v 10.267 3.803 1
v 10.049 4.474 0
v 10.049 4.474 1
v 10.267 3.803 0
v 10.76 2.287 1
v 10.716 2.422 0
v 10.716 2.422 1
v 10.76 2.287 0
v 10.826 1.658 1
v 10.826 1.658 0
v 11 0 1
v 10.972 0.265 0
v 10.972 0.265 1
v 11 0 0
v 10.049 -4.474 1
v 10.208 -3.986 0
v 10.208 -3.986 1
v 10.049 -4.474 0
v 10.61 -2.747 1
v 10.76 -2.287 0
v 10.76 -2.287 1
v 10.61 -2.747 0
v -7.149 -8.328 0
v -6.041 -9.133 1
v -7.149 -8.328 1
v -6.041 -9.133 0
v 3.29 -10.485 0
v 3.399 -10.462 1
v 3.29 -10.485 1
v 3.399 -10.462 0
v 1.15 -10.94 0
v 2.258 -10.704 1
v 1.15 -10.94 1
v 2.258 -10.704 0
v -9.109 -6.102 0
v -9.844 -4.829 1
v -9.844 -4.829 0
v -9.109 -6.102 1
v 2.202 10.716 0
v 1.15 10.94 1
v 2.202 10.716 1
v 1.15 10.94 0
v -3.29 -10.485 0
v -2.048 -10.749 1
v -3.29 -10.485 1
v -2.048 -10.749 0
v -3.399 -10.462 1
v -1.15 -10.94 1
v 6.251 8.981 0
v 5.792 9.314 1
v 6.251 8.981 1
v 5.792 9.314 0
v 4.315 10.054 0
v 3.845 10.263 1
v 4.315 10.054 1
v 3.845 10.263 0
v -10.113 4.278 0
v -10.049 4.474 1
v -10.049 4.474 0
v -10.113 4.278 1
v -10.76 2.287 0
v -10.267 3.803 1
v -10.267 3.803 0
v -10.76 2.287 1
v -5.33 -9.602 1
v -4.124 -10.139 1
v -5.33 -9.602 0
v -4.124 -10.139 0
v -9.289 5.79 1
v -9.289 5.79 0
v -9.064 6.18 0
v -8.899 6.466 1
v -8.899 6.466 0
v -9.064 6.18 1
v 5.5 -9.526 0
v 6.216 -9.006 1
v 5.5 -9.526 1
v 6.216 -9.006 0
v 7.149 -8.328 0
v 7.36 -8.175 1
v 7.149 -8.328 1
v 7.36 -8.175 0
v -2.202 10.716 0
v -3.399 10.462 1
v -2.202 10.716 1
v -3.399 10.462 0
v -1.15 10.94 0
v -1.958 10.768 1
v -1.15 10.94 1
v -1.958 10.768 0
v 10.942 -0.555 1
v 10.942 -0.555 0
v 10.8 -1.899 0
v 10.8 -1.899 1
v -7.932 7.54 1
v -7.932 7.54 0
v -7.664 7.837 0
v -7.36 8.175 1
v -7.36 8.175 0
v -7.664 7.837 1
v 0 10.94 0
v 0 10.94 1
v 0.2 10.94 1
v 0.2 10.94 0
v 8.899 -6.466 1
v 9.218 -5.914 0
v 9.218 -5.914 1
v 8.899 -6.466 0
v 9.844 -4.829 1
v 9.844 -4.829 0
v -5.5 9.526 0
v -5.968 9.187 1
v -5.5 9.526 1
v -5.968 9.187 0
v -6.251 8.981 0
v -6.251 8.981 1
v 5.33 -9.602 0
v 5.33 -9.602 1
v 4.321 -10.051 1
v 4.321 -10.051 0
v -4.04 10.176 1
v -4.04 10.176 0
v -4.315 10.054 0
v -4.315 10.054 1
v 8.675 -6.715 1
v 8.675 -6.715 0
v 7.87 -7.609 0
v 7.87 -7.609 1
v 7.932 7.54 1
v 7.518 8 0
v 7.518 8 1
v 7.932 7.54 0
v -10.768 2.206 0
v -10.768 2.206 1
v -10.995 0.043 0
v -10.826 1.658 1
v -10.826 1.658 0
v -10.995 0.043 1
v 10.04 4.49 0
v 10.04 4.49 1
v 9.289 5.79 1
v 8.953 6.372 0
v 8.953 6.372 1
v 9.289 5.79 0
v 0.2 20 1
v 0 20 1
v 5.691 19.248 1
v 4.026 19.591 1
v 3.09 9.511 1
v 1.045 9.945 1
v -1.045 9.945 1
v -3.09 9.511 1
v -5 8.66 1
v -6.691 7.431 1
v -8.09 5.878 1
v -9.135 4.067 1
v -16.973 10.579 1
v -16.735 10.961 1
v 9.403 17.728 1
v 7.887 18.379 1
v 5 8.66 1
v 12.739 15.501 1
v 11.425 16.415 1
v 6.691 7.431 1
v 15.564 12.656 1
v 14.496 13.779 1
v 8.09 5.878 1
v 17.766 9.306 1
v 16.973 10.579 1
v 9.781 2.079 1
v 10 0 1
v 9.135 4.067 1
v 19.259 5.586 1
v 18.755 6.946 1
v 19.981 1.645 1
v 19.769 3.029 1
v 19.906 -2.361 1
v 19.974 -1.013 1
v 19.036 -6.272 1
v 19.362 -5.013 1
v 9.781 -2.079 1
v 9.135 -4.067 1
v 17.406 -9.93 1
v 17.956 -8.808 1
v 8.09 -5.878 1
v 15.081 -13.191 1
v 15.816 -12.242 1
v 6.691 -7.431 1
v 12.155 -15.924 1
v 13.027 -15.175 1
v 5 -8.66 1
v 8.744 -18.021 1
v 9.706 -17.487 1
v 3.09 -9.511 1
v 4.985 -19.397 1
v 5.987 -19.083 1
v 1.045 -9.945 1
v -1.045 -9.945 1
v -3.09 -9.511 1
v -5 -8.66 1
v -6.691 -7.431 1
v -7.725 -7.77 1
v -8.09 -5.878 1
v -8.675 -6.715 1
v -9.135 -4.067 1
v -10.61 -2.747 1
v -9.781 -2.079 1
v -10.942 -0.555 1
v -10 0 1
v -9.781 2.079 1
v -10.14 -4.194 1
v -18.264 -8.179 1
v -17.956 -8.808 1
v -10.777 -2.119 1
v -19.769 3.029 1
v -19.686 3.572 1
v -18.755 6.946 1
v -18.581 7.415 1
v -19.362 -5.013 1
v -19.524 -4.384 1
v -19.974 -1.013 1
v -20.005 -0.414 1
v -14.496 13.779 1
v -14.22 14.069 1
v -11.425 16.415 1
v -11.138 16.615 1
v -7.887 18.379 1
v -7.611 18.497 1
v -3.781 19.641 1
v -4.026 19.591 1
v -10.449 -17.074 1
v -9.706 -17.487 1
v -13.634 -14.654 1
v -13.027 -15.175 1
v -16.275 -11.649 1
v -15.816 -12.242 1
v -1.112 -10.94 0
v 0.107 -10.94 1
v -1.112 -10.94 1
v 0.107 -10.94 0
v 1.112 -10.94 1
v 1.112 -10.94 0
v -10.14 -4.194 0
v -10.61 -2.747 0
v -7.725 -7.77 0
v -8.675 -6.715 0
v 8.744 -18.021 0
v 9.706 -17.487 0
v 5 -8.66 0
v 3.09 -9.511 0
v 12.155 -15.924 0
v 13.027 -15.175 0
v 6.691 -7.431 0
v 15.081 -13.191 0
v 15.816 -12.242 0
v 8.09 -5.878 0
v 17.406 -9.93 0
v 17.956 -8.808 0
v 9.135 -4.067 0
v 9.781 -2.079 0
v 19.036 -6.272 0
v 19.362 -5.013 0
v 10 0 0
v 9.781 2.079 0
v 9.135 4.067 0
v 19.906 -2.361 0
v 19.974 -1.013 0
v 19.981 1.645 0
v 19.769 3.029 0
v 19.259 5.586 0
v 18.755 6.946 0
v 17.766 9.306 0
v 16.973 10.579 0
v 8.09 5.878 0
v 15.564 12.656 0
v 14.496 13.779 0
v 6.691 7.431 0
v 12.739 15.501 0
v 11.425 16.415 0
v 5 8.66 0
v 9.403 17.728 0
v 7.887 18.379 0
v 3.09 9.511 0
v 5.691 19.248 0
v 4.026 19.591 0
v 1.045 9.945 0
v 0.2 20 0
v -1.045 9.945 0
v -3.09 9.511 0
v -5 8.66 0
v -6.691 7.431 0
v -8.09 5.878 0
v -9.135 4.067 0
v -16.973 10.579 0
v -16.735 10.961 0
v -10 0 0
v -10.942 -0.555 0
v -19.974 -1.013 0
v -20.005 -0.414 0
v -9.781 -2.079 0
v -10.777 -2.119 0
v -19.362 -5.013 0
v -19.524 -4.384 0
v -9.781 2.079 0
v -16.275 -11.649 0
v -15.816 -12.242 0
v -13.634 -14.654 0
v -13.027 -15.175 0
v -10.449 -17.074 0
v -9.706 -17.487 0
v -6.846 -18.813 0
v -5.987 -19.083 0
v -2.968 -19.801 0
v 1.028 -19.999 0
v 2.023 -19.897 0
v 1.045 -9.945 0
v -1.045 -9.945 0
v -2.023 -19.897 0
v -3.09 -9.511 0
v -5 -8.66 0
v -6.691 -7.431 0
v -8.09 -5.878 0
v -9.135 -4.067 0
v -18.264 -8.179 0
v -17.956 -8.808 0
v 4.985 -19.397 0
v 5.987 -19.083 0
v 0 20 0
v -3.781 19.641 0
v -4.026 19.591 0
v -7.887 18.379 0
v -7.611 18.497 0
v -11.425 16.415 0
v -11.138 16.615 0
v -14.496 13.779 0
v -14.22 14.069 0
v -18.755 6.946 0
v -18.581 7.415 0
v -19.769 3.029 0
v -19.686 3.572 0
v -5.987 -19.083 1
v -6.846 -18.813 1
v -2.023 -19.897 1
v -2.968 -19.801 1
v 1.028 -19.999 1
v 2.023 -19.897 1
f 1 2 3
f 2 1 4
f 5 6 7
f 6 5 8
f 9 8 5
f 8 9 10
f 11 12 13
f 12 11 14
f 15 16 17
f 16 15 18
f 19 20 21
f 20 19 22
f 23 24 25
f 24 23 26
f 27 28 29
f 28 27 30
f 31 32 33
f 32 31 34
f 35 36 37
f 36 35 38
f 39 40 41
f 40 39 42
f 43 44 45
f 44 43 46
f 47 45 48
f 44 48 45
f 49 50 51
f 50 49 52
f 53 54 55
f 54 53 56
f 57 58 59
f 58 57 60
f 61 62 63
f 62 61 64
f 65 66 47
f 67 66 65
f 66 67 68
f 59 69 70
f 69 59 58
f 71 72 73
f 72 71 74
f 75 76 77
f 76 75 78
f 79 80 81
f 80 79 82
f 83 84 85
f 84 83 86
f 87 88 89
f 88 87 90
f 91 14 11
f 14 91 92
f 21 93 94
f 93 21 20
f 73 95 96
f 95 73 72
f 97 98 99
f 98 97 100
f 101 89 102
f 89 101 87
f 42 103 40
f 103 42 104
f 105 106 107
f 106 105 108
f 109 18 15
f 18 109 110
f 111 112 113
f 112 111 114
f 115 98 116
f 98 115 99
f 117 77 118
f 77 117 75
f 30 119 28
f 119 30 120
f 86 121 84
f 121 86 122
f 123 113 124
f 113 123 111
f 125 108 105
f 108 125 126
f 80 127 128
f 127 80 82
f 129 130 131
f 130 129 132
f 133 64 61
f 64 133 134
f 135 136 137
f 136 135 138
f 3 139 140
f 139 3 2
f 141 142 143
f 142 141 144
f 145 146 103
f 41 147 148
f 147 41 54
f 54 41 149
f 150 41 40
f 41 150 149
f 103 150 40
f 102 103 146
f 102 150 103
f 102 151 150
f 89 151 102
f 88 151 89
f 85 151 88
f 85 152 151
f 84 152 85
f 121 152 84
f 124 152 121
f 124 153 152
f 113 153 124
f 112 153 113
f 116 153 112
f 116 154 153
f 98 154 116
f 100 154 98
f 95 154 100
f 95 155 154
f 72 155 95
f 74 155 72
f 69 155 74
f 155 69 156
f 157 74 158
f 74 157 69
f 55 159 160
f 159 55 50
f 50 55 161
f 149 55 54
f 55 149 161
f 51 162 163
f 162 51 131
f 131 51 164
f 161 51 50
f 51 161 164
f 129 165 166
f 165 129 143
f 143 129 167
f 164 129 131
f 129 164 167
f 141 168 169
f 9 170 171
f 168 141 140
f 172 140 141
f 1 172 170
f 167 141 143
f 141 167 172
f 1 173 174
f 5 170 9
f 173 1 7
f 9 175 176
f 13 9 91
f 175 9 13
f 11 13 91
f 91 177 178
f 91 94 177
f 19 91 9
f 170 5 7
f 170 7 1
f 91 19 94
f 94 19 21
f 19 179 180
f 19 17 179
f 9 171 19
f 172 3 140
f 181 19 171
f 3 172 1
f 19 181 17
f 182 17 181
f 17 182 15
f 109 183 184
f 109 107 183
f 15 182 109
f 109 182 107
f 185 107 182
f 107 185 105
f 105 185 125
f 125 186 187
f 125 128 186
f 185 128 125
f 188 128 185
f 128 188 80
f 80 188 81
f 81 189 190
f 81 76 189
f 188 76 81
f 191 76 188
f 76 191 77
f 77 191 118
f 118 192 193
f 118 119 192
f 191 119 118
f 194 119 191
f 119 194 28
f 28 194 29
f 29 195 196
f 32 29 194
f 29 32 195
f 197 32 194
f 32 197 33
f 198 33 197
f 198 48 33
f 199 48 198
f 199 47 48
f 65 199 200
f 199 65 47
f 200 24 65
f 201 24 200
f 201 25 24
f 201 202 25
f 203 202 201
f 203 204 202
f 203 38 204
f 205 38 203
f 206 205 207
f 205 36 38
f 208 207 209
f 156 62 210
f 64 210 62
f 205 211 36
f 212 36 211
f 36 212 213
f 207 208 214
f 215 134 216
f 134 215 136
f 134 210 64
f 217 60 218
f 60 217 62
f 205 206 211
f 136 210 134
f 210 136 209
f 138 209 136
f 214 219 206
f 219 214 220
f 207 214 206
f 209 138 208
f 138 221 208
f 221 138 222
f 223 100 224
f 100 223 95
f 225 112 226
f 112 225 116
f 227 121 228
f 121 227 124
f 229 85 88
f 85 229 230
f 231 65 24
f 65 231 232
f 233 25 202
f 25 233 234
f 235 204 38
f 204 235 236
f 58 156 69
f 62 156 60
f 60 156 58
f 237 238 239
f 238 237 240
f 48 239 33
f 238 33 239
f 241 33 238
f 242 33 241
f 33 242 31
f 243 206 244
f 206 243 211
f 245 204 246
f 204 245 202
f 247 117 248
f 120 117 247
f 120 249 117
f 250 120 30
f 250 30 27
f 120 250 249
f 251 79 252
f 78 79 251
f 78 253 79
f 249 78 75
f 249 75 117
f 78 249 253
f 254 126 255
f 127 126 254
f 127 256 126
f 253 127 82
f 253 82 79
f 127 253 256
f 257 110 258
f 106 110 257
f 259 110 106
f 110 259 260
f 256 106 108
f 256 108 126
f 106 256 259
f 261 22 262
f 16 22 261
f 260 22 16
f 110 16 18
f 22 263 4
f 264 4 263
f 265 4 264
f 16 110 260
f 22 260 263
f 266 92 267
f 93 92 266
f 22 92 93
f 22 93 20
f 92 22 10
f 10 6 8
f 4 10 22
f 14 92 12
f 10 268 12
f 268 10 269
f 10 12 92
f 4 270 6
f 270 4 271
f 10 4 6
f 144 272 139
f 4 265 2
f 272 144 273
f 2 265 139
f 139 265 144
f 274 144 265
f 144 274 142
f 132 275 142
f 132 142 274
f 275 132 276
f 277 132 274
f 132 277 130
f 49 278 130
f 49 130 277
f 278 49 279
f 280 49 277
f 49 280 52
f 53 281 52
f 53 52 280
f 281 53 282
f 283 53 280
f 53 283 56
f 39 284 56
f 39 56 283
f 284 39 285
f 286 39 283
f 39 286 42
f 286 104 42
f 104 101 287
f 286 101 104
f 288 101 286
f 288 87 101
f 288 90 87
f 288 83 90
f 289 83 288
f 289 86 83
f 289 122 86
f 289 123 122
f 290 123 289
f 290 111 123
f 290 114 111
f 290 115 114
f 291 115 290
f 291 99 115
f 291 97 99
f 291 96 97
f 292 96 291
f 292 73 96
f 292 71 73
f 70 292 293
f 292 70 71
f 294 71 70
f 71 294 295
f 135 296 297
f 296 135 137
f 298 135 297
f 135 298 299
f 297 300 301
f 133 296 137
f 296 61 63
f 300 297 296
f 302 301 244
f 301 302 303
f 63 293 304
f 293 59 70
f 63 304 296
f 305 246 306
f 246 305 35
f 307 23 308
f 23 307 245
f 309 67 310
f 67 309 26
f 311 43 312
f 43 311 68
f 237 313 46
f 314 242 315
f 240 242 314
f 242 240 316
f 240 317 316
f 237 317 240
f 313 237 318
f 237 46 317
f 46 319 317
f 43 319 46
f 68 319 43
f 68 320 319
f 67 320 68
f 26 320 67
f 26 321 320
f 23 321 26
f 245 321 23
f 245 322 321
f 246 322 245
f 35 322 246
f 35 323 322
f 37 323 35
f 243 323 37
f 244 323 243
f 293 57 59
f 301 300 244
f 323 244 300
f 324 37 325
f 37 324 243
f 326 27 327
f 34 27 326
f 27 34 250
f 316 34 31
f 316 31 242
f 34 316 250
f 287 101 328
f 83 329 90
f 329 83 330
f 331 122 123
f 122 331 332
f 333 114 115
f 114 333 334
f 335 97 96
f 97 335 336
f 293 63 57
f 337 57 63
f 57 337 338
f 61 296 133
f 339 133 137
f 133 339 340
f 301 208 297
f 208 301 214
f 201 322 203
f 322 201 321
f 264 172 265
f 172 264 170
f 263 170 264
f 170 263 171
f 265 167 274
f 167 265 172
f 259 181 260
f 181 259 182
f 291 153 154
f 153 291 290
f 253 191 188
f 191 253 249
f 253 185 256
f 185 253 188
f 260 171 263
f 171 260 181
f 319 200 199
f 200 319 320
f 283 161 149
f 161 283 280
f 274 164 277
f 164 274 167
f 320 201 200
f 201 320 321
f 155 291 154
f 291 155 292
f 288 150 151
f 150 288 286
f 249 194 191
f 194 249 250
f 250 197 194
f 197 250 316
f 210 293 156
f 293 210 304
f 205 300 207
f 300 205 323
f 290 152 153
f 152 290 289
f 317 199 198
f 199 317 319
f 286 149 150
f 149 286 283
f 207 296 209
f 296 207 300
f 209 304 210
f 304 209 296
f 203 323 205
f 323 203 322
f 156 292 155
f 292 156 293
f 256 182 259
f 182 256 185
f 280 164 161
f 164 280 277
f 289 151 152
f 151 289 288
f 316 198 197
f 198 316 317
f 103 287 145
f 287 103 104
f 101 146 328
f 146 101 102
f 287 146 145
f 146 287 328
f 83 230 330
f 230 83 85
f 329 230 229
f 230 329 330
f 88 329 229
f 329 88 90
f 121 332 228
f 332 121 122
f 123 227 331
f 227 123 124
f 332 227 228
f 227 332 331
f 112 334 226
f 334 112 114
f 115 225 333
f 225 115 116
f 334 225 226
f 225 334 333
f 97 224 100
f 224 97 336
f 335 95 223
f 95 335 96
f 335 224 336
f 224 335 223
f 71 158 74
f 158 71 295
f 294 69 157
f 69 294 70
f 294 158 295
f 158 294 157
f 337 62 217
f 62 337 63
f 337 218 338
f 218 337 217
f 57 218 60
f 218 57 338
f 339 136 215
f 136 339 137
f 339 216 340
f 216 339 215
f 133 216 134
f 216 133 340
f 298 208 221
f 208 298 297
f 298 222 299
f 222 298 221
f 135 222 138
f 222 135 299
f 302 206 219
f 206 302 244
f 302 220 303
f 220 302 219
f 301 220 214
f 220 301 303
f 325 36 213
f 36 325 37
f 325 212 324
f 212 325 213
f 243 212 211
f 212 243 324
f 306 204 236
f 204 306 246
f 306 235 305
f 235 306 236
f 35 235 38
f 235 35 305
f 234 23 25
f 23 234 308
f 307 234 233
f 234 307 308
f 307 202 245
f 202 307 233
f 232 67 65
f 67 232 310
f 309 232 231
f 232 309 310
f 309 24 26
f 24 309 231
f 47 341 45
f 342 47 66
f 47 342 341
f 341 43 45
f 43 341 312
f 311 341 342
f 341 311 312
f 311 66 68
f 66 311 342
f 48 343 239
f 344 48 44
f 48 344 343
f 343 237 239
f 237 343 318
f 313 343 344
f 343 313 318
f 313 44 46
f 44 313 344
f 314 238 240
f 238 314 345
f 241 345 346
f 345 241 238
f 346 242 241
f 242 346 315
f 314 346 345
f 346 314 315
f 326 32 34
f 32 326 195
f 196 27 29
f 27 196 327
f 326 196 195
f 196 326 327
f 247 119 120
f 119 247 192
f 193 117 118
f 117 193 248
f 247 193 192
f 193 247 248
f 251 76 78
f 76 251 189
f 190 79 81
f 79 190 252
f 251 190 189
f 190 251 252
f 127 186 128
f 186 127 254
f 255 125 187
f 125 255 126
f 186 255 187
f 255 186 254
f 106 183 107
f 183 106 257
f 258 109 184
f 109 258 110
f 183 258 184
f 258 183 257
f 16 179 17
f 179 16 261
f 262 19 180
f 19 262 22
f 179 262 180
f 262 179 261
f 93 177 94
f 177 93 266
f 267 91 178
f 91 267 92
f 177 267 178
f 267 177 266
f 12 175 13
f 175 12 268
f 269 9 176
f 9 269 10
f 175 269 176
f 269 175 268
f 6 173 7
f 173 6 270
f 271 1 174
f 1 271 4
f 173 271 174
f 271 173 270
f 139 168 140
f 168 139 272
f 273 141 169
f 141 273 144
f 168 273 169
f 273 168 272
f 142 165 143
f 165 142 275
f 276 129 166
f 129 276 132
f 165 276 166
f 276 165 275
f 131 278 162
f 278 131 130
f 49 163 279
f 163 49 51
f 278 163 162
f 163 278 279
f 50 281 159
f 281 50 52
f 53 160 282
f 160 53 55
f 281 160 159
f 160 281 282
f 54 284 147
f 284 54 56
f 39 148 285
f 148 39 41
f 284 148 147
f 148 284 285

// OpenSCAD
// Wall Thickness Test Object

start_thickness = 0.2; // [0:0.01:2]
increment = 0.05; // [0:0.01:0.2]
iterations = 30; // [10:1:50]
length = 10; // [5:2:50]
offset = 10; // [5:2:40]
height = 1.0; // [0.1:0.1:2]
base_thickness = 1; // [1:1:100]
base_height = 1.0; // [0.1:0.1:2]
  
module walltest()
{
  module testline(width, length, height, offset, theta)
  {
      rotate(theta)
      translate([0, offset, 0])
      cube([width, length, height], center=false);
  }

  difference() {
    cylinder(base_height, offset+base_thickness, offset+base_thickness, center=false);
    translate([0, 0, -1])
    cylinder(base_height+2, offset, offset, center=false);
  }

  for(i = [0:iterations]) {
    testline(start_thickness + i * increment, length, height, offset, 360/(iterations+1) * i);
    echo(start_thickness + i * increment);
  }
}

walltest();
